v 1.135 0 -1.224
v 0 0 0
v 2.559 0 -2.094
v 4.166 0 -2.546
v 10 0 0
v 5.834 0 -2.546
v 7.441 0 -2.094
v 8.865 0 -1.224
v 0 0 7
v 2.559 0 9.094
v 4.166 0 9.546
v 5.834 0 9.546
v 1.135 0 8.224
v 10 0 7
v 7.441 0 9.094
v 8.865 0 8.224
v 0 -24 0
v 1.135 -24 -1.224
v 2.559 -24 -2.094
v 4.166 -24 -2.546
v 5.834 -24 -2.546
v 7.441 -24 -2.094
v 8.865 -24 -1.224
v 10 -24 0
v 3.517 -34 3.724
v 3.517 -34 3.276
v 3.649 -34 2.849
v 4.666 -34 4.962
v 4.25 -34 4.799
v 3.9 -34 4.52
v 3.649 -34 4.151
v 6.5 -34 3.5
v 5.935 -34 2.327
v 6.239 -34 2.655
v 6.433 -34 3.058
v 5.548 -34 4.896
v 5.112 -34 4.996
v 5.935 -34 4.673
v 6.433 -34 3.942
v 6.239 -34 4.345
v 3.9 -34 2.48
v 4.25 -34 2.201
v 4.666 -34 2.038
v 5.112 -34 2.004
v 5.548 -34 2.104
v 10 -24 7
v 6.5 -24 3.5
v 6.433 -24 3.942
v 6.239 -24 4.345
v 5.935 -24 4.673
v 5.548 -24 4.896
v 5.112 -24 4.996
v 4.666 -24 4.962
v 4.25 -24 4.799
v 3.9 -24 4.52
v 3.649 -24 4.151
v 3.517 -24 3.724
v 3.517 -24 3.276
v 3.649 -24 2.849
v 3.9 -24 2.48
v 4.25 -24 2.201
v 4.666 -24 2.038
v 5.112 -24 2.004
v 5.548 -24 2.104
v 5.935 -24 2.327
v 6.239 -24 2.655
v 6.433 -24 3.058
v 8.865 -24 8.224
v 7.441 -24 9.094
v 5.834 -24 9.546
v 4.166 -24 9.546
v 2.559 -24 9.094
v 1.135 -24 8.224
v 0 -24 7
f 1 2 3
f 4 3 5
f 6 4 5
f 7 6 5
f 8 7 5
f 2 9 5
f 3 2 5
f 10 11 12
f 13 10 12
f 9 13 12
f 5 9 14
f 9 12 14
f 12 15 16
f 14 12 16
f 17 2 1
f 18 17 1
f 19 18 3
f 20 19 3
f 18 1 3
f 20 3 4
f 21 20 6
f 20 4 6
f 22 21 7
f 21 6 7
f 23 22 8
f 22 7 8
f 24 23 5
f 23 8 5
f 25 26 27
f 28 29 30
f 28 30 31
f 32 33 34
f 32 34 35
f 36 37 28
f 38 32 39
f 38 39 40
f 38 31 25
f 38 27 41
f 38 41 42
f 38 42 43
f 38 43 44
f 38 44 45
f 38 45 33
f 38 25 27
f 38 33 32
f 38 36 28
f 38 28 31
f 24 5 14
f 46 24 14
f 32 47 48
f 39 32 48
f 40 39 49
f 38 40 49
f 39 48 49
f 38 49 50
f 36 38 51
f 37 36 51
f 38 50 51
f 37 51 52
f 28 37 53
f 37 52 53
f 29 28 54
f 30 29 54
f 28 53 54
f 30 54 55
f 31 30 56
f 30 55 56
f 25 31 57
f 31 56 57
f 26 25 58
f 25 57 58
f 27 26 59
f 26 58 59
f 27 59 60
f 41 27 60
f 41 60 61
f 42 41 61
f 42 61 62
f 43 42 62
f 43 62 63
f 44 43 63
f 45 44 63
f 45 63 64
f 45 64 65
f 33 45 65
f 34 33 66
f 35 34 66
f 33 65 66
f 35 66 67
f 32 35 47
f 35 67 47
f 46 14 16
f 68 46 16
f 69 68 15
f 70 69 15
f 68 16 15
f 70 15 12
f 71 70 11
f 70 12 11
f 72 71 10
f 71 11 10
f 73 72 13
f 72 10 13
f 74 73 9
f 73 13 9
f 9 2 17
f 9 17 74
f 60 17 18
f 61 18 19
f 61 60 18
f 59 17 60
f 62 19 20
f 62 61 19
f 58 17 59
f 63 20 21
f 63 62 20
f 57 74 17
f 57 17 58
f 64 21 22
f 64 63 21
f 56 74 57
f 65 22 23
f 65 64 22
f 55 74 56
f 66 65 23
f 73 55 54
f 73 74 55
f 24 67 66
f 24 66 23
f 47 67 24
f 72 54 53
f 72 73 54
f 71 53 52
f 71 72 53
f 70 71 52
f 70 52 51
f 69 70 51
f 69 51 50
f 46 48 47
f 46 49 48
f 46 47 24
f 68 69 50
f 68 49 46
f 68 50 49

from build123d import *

# Parameters (mm, degrees)
F0_W     = 10
F0_H     = 7
F1_DEPTH = 24
F2_R     = 1.5
F3_DEPTH = 10


with BuildPart() as f1:
    # F0 (on Front) → F1 (new body)
    with BuildSketch(Plane.XZ):
        with BuildLine():
            Line((10, 0), (0, 0))
            ThreePointArc((0, 0), (5, -2.603278), (10, 0))
        make_face()
        with BuildLine():
            ThreePointArc((10, 7), (5, 9.603278), (0, 7))
            Line((0, 7), (10, 7))
        make_face()
        with Locations((5, 3.5)):
            Rectangle(F0_W, F0_H)
    extrude(amount=F1_DEPTH)

    # F2 (on face) → F3 (join)
    with BuildSketch(Plane.XZ.offset(24)):
        with Locations((5, 3.5)):
            Circle(F2_R)
    extrude(amount=F3_DEPTH)


solid = f1.part
